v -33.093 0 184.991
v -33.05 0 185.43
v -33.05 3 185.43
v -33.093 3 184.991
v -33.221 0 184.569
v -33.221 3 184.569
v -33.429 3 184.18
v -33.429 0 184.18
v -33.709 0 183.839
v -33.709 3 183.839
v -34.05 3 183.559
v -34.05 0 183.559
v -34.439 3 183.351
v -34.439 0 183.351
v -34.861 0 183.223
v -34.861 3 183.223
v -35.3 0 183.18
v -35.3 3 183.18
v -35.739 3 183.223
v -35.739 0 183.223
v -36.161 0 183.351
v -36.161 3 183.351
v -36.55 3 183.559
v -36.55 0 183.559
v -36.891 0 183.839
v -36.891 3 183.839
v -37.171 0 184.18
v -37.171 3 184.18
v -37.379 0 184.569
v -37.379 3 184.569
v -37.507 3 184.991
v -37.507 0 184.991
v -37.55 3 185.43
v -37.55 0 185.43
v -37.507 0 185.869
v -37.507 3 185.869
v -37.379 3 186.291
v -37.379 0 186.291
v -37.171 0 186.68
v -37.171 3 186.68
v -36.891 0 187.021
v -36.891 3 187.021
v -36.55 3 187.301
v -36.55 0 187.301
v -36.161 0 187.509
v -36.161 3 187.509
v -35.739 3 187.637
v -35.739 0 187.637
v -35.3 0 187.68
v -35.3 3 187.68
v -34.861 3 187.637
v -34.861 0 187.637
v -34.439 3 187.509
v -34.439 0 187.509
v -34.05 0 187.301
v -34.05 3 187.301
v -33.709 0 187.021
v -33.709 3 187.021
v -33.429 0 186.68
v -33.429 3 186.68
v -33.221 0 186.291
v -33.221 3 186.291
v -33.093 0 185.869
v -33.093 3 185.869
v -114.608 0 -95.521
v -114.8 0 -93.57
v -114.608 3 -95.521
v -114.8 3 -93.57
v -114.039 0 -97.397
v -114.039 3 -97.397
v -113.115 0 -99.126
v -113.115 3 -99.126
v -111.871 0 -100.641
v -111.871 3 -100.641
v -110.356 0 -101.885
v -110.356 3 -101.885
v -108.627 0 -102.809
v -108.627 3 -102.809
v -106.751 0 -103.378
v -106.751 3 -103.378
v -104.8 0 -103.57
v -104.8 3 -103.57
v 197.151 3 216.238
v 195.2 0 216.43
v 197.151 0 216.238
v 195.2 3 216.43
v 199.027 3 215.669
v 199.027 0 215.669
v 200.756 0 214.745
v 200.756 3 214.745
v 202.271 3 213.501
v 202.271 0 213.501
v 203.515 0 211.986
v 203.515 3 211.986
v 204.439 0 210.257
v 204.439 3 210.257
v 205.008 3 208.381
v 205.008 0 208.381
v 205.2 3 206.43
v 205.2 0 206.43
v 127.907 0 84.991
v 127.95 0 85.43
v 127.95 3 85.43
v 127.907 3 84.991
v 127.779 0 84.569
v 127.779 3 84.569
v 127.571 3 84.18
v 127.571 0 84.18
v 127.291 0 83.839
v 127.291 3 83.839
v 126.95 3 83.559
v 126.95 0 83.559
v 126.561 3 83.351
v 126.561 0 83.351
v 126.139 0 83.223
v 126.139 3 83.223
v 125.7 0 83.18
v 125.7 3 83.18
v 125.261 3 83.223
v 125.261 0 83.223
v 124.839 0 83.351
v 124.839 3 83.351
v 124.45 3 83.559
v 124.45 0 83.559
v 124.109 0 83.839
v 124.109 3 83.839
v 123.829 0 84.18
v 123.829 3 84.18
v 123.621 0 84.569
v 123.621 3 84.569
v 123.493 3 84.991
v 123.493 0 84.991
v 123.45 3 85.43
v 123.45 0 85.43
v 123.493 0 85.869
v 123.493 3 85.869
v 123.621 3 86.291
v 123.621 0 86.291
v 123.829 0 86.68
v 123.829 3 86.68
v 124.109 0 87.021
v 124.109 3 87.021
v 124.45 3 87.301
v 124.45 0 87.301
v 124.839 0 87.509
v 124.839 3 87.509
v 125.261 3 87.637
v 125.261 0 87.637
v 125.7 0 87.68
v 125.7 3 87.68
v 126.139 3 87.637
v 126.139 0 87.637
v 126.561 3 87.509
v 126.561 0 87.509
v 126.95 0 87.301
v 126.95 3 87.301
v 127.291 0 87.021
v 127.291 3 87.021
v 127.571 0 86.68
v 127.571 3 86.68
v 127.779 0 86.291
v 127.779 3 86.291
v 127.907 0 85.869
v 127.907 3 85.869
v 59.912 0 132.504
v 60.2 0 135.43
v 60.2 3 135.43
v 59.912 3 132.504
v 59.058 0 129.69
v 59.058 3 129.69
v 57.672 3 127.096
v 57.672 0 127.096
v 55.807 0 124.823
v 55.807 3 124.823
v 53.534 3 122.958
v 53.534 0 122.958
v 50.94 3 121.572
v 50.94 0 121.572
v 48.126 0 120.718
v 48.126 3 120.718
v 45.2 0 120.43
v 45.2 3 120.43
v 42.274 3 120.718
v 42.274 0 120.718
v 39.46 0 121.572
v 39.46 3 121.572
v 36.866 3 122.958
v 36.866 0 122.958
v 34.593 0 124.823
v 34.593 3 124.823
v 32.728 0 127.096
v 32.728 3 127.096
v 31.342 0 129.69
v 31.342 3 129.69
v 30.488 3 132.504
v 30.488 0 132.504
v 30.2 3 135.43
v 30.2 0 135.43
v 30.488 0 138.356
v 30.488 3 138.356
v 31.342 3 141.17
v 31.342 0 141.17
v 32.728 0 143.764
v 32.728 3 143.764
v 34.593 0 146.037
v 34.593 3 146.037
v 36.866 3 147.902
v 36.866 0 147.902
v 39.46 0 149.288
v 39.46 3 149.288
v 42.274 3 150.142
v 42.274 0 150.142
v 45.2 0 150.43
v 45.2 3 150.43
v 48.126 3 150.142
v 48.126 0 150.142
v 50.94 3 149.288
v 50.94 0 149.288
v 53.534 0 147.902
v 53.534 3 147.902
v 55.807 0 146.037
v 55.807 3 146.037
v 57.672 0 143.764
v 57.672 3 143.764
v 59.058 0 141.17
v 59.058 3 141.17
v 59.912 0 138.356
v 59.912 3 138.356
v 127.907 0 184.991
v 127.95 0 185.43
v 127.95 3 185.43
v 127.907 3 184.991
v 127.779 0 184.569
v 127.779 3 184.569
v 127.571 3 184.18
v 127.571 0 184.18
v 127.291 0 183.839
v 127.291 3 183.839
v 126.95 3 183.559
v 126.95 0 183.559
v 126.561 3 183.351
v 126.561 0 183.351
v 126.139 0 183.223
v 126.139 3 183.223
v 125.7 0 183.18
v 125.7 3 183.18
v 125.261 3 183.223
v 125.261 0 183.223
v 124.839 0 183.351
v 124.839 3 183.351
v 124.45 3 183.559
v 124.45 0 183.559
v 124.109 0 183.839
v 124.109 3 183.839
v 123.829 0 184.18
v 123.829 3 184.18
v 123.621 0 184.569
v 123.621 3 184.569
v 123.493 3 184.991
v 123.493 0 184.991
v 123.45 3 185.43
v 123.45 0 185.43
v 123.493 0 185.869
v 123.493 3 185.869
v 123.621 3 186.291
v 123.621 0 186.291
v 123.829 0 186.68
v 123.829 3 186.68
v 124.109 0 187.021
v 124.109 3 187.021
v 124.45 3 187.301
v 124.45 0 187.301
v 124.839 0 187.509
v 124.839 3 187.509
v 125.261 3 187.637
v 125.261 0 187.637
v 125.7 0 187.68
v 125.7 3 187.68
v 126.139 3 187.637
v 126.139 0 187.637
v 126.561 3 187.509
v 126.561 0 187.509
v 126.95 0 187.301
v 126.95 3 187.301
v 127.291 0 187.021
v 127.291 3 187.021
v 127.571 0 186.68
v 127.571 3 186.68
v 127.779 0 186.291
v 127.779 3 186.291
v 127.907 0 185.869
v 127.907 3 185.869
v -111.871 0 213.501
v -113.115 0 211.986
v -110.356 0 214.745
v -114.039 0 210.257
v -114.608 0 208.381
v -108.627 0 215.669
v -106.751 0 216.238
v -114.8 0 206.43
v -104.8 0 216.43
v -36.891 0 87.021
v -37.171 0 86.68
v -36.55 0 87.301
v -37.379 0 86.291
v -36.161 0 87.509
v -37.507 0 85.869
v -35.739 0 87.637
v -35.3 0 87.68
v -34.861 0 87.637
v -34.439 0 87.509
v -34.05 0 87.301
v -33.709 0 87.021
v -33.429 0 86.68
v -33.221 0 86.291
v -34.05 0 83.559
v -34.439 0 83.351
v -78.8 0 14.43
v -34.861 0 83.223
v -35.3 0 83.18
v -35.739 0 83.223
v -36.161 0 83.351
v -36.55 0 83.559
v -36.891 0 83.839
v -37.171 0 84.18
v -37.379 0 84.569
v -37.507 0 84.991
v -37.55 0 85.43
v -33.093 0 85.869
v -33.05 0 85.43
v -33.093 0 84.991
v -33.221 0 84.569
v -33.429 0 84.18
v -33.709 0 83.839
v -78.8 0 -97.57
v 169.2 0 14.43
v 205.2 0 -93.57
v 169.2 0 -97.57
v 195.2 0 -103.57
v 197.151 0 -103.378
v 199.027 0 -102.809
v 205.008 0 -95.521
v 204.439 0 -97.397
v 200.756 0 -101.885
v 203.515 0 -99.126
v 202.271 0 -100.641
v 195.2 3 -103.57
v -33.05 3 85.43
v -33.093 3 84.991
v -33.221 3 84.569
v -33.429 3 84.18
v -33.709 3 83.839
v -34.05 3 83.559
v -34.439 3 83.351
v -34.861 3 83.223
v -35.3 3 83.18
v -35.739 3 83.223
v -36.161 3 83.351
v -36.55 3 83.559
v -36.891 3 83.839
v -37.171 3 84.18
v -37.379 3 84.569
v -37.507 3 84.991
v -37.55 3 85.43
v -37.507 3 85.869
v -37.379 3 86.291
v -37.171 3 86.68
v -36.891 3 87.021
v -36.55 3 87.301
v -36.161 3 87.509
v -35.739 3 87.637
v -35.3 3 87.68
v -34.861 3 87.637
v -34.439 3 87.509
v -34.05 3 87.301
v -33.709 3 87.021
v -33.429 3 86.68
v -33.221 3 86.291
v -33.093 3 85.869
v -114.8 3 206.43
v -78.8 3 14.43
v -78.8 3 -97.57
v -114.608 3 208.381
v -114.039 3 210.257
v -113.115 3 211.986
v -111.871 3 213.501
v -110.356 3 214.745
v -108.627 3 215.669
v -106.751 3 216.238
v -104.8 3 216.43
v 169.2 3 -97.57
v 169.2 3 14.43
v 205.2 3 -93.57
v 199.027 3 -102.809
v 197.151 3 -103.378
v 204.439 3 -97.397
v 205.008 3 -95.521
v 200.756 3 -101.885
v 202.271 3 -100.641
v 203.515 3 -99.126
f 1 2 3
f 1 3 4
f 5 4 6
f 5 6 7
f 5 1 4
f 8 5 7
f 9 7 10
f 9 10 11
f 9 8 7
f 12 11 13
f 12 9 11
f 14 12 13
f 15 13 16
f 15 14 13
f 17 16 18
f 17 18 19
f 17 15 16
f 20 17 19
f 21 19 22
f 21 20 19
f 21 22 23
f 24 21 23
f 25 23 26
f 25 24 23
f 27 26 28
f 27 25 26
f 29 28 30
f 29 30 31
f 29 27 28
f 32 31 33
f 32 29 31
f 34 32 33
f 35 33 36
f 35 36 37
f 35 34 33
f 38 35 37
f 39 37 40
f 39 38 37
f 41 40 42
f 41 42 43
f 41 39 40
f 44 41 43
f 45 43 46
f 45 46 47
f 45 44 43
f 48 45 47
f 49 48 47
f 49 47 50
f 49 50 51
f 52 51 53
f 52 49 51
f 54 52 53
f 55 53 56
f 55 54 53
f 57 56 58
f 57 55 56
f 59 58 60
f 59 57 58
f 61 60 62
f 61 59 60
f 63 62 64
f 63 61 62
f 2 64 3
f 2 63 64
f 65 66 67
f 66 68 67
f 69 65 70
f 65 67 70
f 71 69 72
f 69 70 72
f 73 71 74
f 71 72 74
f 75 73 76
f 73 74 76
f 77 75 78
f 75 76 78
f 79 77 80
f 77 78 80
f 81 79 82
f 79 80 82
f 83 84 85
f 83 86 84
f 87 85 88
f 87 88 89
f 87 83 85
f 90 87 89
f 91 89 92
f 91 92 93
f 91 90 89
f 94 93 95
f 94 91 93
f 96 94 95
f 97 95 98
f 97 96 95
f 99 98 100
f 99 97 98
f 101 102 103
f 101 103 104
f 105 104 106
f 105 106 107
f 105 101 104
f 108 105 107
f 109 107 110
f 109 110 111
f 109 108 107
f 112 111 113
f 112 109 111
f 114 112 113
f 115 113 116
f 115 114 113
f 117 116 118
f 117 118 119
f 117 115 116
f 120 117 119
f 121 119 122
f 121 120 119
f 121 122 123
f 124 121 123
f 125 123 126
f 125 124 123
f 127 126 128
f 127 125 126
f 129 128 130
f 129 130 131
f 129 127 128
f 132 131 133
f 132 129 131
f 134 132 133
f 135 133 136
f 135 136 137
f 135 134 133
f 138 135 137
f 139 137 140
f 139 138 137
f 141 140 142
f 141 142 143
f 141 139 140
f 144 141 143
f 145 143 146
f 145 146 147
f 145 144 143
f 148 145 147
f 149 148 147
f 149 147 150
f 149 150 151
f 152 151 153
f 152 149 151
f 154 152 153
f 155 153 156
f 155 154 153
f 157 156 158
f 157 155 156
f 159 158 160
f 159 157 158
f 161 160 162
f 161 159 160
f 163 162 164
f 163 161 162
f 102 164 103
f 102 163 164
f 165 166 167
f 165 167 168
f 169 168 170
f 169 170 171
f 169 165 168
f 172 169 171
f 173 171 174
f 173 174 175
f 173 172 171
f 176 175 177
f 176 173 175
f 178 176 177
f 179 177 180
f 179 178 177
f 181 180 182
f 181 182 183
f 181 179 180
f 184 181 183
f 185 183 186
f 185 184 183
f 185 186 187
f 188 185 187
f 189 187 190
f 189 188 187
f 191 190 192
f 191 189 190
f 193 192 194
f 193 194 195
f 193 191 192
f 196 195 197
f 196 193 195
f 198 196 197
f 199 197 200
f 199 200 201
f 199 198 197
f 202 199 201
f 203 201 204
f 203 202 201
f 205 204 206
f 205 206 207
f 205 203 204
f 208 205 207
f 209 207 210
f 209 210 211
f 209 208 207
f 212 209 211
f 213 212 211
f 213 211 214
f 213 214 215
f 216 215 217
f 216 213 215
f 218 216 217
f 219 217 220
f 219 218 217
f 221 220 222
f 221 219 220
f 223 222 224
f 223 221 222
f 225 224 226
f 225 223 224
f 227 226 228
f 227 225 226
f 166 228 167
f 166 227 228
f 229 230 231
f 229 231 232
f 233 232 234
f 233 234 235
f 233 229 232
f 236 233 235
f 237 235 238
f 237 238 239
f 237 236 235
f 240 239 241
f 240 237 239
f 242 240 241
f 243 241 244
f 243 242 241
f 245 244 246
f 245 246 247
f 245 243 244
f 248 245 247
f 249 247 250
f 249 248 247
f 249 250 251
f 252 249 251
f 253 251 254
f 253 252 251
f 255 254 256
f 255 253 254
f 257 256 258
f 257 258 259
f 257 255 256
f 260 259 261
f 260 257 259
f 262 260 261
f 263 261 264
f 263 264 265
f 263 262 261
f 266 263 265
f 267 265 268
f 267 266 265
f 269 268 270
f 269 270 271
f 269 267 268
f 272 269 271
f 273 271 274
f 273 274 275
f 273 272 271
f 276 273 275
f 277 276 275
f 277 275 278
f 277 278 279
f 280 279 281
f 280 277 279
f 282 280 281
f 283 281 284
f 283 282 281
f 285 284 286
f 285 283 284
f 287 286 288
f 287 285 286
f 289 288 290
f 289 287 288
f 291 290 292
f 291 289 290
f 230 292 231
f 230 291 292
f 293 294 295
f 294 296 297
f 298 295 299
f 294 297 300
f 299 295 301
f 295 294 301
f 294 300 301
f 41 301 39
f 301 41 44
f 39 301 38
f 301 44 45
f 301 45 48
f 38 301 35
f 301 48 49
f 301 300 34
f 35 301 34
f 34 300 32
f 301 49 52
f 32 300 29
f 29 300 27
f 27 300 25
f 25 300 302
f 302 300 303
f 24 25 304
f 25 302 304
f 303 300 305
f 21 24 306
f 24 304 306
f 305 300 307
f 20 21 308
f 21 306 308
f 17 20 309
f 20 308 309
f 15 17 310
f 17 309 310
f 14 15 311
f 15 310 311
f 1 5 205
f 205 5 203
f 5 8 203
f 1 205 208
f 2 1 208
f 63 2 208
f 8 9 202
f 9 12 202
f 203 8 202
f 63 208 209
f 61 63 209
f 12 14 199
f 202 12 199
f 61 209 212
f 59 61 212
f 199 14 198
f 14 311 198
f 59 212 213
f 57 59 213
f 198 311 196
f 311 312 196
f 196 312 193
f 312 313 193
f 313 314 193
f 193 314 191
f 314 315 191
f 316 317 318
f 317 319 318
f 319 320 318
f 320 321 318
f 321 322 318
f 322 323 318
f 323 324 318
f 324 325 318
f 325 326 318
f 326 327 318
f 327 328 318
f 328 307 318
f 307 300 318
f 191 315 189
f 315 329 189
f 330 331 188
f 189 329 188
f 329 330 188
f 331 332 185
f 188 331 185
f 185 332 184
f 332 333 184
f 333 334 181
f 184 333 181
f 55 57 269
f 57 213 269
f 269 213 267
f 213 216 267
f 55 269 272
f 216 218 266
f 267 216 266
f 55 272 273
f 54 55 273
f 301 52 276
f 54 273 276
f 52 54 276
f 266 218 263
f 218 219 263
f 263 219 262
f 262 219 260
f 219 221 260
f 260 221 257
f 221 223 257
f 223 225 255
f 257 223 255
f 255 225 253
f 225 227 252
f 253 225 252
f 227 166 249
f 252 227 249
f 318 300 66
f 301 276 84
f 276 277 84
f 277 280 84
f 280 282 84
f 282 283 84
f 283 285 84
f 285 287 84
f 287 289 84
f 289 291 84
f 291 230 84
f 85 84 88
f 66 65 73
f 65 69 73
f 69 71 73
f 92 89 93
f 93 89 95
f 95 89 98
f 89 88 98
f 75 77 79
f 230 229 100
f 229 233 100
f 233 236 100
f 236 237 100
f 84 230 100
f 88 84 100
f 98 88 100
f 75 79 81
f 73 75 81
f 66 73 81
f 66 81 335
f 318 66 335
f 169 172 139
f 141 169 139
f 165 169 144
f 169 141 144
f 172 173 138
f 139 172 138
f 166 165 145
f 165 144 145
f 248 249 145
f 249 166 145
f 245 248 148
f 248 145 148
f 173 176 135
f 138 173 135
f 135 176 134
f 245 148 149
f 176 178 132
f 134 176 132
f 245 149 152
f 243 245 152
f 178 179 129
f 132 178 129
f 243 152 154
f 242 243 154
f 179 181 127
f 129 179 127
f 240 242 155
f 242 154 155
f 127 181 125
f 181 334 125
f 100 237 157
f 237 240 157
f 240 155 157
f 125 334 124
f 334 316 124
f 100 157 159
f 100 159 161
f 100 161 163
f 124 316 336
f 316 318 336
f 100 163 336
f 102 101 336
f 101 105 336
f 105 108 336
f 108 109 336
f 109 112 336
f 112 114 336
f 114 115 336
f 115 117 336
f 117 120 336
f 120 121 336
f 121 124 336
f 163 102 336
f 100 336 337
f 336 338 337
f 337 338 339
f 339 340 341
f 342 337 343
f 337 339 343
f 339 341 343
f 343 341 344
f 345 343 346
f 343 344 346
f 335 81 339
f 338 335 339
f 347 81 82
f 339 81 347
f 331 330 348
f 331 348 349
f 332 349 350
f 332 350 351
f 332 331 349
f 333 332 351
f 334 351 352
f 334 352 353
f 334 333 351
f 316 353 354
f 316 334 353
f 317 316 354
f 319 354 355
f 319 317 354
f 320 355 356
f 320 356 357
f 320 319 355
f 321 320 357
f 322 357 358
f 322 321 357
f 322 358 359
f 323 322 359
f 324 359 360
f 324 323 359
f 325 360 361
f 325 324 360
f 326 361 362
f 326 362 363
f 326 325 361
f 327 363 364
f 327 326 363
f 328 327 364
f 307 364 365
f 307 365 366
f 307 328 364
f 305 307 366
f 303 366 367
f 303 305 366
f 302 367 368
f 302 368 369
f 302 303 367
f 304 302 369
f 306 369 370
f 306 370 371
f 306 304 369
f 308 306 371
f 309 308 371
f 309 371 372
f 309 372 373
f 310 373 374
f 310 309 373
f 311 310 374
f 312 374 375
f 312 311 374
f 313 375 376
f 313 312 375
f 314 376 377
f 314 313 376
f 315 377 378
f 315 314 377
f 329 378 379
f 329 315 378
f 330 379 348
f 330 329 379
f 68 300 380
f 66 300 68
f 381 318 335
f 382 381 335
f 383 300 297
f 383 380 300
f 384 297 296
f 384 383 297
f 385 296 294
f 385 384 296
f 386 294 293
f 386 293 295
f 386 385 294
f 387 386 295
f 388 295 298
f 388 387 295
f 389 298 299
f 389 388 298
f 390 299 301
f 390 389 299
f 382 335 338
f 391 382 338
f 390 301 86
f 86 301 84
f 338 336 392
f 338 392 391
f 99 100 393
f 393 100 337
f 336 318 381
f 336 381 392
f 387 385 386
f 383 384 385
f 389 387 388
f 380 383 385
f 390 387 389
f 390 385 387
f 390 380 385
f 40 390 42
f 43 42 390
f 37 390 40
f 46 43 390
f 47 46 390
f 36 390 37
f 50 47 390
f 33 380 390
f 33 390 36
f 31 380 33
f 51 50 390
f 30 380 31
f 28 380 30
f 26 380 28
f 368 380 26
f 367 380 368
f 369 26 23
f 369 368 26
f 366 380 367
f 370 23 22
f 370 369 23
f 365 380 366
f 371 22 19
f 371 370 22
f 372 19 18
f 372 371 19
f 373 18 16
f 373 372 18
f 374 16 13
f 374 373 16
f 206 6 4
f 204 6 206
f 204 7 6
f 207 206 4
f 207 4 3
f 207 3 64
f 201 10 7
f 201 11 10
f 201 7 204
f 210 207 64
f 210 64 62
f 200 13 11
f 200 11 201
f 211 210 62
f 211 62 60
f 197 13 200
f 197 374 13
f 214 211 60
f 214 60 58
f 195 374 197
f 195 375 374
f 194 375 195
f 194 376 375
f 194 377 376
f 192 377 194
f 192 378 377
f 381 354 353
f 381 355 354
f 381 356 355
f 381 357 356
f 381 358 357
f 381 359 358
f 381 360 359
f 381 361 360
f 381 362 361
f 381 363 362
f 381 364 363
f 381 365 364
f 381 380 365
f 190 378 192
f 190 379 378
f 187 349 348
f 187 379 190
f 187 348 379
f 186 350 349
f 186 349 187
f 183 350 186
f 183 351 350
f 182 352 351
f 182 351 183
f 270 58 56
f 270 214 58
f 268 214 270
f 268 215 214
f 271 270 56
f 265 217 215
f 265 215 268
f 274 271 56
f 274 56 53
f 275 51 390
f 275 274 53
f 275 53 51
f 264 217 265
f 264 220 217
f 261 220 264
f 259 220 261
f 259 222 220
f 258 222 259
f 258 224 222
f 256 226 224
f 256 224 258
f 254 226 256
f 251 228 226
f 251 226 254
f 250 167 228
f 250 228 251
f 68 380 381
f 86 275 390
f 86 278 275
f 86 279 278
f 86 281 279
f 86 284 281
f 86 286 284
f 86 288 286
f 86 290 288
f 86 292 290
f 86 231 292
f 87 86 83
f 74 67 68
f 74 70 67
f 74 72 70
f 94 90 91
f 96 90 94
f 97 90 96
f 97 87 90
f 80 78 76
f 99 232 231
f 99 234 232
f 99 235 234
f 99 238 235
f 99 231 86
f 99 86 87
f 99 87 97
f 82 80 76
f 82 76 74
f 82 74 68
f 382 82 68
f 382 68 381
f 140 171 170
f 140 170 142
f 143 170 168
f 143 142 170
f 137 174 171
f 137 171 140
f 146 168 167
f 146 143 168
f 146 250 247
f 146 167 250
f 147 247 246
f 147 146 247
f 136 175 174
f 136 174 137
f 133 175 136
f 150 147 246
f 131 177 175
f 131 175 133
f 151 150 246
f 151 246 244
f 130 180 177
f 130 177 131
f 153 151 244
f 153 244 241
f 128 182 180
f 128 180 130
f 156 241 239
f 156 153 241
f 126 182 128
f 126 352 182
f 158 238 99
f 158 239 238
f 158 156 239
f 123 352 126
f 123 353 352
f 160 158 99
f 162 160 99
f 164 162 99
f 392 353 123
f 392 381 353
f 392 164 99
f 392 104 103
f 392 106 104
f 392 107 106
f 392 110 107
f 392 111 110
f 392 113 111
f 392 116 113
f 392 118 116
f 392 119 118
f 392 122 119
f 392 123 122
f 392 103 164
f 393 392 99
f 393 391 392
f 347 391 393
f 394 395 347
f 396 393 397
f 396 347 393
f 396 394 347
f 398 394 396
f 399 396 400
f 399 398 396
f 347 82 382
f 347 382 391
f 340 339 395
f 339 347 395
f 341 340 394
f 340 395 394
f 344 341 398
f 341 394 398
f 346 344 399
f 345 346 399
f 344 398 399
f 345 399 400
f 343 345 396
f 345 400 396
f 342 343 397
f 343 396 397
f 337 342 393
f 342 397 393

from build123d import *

# Parameters (mm, degrees)
SKETCH1_W           = 320
SKETCH1_H           = 320
SKETCH1_R           = 2.25
SKETCH1_R_2         = 15
SKETCH1_W_2         = 248
SKETCH1_H_2         = 112
BOSS_EXTRUDE1_DEPTH = 3
FILLET1_R           = 10


with BuildPart() as part:
    # Sketch1 → Boss-Extrude1 (new body)
    with BuildSketch(Plane(origin=(0, 0, 0), x_dir=(1, 0, 0), z_dir=(0, 1, 0))):
        with Locations((45.2, -56.43)):
            Rectangle(SKETCH1_W, SKETCH1_H)
        with Locations((-35.3, -85.43)):
            Circle(SKETCH1_R, mode=Mode.SUBTRACT)
        with Locations((125.7, -85.43)):
            Circle(SKETCH1_R, mode=Mode.SUBTRACT)
        with Locations((125.7, -185.43)):
            Circle(SKETCH1_R, mode=Mode.SUBTRACT)
        with Locations((-35.3, -185.43)):
            Circle(SKETCH1_R, mode=Mode.SUBTRACT)
        with Locations((45.2, -135.43)):
            Circle(SKETCH1_R_2, mode=Mode.SUBTRACT)
        with Locations((45.2, 41.57)):
            Rectangle(SKETCH1_W_2, SKETCH1_H_2, mode=Mode.SUBTRACT)
    extrude(amount=BOSS_EXTRUDE1_DEPTH)

    # Fillet1
    fillet1_edges = [part.edges().sort_by_distance(p)[0] for p in [
        (205.2, 1.5, 216.43),
        (-114.8, 1.5, 216.43),
        (-114.8, 1.5, -103.57),
        (205.2, 1.5, -103.57),
    ]]
    fillet(fillet1_edges, radius=FILLET1_R)


solid = part.part
